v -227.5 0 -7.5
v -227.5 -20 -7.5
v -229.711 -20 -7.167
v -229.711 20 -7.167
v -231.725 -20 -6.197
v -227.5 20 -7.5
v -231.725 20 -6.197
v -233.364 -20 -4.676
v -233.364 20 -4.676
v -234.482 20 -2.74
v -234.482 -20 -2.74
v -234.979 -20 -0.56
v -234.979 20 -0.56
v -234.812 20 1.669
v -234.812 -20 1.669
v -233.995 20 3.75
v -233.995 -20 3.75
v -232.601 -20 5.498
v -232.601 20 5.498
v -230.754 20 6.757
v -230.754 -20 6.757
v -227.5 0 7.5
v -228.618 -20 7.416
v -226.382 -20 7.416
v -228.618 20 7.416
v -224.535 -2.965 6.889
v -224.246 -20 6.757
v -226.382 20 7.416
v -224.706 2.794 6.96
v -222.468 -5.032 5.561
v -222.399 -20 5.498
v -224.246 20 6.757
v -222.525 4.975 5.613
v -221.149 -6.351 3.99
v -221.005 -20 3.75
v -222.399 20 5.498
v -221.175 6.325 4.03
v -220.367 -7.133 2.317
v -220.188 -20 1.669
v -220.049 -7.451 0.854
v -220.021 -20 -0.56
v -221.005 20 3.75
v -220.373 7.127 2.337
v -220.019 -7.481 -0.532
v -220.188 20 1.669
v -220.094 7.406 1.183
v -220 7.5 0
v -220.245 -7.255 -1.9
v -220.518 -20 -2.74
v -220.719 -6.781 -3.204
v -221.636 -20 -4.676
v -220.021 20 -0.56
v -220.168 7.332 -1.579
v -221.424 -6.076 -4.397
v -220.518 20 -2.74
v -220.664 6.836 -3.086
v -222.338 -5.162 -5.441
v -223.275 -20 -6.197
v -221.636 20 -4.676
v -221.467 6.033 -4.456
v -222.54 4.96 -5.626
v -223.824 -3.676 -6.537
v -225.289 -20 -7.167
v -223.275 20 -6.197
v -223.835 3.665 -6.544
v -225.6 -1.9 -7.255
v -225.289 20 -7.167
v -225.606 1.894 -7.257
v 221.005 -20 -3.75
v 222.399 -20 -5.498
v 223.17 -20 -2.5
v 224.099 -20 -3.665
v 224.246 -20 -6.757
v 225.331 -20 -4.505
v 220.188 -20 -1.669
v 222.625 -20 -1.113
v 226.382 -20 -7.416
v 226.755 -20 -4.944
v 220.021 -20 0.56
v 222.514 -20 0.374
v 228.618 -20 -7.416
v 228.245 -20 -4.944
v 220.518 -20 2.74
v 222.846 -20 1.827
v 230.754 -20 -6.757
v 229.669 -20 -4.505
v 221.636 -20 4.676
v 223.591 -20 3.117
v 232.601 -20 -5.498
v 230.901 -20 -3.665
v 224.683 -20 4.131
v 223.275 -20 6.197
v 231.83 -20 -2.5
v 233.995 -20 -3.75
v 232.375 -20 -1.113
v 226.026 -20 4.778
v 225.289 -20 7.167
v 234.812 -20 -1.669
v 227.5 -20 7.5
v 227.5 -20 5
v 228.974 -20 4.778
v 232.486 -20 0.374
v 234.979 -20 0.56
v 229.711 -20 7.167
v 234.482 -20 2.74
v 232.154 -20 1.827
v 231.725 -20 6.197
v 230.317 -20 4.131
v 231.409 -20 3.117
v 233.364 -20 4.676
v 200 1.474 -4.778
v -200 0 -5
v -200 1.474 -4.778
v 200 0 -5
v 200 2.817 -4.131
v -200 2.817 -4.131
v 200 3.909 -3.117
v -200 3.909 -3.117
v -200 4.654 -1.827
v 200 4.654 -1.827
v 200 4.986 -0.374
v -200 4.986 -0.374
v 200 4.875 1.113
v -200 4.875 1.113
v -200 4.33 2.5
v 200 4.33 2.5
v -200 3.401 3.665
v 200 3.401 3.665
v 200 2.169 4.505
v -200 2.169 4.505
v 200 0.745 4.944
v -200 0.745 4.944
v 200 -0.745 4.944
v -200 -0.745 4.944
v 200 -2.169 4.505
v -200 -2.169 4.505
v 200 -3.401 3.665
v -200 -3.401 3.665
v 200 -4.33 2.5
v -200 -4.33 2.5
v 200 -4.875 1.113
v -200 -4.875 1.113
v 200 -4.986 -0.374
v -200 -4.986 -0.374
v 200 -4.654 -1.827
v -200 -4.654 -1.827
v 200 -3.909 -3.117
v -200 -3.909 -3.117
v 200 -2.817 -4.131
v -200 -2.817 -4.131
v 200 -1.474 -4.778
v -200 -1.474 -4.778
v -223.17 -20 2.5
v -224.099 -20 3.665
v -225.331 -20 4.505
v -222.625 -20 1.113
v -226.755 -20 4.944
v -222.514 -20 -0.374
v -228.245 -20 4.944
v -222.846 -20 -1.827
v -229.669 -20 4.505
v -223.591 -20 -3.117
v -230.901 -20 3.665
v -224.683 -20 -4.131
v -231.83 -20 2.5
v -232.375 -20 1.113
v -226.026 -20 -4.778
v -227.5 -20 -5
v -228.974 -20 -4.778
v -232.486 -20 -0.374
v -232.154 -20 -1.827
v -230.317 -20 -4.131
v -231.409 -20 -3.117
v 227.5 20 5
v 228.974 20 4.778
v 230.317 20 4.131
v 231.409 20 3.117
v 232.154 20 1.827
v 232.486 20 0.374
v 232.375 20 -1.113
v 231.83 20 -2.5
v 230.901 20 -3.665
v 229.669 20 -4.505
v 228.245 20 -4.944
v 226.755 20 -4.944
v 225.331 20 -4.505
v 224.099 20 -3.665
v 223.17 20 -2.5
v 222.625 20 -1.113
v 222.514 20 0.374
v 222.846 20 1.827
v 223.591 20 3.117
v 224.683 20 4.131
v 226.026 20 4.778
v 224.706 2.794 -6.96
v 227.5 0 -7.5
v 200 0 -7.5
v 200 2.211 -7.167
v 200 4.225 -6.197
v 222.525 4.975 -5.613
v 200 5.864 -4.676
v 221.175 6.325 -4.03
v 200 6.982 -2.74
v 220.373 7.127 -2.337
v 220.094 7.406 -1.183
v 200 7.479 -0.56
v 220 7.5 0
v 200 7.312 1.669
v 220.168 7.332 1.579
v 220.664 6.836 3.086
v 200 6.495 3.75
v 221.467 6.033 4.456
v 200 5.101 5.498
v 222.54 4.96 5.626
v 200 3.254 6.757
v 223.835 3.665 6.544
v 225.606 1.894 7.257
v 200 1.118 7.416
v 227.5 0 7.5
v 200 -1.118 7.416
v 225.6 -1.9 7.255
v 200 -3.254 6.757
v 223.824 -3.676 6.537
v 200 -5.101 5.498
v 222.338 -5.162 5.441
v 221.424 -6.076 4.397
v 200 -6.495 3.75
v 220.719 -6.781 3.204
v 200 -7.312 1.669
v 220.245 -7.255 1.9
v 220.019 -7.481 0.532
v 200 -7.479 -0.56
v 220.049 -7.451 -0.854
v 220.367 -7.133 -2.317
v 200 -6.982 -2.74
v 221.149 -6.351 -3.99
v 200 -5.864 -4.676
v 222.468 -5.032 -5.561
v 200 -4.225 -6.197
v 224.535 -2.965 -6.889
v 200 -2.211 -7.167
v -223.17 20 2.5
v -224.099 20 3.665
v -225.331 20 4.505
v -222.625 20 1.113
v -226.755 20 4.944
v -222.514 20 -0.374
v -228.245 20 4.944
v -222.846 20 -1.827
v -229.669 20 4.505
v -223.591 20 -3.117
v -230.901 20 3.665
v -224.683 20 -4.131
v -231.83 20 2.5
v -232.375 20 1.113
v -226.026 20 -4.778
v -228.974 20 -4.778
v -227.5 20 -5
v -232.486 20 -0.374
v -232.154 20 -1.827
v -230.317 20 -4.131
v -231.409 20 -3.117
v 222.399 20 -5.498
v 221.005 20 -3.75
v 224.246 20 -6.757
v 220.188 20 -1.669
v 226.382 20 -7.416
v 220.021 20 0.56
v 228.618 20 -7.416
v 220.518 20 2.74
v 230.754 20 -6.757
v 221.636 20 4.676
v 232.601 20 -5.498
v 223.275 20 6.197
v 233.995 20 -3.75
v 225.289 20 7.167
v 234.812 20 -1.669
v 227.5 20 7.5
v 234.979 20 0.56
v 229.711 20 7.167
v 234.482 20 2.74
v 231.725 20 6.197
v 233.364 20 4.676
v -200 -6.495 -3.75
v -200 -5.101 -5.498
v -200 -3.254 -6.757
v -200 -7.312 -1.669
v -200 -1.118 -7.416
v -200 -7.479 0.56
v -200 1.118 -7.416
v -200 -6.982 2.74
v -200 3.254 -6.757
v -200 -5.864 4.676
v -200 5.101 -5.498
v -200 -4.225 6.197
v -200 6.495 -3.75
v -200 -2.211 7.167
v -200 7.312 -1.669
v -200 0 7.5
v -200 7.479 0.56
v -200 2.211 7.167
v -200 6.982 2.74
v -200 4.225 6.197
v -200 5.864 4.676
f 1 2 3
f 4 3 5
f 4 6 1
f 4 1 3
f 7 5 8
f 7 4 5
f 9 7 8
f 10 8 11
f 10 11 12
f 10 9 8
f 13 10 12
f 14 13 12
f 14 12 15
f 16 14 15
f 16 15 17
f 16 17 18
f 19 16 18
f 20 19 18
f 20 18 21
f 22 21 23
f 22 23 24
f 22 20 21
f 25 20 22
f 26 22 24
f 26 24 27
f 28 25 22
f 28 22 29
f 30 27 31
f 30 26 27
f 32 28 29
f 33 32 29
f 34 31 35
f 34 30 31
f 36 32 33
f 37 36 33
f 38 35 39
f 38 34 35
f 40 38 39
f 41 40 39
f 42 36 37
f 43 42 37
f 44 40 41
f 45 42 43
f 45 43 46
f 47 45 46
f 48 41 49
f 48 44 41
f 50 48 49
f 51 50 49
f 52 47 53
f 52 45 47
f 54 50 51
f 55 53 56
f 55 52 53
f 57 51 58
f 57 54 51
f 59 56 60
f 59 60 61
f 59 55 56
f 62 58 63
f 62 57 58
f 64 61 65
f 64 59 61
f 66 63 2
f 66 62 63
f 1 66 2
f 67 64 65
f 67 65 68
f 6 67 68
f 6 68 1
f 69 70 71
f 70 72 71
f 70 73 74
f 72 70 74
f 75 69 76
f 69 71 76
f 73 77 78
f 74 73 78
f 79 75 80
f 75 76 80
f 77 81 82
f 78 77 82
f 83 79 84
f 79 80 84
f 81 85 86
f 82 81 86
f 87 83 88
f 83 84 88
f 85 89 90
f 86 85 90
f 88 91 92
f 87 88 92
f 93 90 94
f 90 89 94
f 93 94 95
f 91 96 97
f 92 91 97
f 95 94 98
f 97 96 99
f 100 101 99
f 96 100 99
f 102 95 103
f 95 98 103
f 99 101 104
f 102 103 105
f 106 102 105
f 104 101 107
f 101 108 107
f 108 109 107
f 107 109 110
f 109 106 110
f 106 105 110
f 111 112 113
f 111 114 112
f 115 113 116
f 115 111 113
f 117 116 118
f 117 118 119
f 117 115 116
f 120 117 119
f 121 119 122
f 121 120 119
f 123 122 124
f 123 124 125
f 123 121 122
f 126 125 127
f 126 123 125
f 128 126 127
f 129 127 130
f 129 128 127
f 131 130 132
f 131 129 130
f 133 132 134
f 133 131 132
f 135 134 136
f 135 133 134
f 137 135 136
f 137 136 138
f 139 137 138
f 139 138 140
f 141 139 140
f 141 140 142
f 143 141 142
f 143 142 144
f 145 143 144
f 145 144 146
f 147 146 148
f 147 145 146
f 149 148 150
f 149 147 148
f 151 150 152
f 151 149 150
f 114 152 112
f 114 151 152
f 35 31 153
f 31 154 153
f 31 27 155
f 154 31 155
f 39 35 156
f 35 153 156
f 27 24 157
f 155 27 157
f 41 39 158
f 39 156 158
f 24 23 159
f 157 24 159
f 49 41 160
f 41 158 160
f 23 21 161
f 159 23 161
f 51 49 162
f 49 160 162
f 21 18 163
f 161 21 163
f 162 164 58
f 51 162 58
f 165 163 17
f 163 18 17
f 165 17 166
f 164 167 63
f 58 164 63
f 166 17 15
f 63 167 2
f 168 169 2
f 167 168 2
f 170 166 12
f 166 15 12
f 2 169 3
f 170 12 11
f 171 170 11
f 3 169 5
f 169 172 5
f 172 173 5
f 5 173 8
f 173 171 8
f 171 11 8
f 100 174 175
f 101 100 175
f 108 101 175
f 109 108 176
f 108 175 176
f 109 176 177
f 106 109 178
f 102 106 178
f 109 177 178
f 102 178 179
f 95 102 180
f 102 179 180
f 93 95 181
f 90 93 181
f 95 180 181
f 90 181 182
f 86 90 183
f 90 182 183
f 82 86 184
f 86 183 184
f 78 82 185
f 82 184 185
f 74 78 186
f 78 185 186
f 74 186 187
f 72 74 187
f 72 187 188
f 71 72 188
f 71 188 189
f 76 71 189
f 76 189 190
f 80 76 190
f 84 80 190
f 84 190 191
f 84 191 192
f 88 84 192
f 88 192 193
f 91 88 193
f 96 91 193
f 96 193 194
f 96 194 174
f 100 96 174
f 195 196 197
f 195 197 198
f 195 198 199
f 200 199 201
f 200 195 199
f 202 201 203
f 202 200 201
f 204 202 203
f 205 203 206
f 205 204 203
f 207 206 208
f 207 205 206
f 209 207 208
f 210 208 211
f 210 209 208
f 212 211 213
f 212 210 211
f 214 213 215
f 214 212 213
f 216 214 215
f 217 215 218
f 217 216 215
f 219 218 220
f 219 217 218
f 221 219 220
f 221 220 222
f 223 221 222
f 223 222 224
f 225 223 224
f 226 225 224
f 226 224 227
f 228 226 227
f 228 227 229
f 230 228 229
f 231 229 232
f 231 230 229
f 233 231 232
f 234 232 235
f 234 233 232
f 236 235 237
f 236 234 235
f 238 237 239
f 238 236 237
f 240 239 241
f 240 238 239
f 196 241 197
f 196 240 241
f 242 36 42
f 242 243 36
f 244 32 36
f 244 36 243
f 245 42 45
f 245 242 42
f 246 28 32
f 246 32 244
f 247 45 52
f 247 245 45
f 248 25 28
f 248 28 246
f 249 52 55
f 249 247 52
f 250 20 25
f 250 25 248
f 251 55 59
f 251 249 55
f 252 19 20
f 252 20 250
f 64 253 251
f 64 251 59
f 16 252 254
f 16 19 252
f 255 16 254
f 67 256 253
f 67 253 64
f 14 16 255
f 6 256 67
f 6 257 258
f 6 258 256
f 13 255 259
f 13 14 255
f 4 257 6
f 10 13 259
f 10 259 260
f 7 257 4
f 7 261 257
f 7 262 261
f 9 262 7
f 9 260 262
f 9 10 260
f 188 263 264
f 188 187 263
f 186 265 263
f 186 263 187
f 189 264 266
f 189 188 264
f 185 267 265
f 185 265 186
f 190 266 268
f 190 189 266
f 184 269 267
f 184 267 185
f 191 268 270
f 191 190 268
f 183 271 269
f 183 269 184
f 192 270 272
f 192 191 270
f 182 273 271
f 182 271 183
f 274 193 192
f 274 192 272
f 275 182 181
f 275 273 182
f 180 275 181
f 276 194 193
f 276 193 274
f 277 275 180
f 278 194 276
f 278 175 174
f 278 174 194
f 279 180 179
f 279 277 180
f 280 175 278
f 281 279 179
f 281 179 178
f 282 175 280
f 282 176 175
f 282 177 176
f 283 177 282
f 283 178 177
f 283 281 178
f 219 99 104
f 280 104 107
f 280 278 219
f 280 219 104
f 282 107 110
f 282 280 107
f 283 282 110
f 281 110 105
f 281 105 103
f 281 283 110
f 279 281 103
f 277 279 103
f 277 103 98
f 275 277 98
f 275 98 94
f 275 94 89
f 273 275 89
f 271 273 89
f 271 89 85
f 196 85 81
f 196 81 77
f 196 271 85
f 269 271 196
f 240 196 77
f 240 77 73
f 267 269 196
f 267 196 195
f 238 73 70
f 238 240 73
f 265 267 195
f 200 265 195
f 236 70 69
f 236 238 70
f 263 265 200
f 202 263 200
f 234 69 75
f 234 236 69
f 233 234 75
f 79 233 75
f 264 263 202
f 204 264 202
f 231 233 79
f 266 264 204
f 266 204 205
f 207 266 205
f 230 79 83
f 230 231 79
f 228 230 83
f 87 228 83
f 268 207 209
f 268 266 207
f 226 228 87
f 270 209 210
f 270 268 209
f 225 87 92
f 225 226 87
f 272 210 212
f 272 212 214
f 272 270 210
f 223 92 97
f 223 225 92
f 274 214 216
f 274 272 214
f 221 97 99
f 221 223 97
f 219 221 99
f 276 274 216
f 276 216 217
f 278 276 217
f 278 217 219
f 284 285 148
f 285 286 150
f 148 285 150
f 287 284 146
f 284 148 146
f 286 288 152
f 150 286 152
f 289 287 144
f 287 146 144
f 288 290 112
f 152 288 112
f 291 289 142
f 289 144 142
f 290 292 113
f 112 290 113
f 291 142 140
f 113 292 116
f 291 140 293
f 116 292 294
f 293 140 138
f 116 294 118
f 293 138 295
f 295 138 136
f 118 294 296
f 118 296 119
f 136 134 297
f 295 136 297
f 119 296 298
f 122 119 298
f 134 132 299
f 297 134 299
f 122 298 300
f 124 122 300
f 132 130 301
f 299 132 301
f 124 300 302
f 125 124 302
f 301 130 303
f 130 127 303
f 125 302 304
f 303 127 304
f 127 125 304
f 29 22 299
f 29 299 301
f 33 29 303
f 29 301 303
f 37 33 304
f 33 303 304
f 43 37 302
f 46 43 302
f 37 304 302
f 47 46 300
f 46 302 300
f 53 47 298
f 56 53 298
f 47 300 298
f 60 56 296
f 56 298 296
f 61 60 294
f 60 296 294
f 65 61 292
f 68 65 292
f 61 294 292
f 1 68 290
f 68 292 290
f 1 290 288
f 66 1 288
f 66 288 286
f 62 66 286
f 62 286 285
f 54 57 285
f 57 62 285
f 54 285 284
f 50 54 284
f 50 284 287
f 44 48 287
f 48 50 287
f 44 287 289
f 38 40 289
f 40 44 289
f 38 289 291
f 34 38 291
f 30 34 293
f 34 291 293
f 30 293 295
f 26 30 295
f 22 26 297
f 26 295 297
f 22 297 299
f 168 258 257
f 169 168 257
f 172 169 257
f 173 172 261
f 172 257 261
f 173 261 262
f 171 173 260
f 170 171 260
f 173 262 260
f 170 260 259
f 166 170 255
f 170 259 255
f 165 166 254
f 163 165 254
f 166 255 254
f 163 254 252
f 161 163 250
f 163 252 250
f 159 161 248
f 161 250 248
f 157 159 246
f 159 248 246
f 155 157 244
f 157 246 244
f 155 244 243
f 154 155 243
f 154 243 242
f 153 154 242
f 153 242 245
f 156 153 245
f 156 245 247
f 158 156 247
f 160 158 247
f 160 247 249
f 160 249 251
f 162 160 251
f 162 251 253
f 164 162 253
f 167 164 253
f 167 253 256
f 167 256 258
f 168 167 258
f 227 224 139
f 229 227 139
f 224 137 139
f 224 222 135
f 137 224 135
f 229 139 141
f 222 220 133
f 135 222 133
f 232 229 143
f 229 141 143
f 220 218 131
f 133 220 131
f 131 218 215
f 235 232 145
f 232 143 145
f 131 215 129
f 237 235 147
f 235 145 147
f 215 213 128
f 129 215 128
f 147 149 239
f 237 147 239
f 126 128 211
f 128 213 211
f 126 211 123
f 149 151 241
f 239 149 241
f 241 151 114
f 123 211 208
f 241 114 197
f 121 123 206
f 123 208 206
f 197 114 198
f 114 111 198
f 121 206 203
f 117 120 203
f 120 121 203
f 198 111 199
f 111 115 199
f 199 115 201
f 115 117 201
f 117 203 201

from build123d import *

# Parameters (mm, degrees)
SKETCH1_R             = 5
BOSS_EXTRUDE1_DEPTH   = 200
SKETCH2_R             = 7.5
BOSS_EXTRUDE2_DEPTH   = 20
BOSS_EXTRUDE2_2_DEPTH = 20
SKETCH3_R             = 7.5
BOSS_EXTRUDE3_DEPTH   = 27.5
BOSS_EXTRUDE4_START   = 27.5
SKETCH4_R             = 7.5
BOSS_EXTRUDE4_DEPTH   = 27.5
SKETCH5_R             = 5
CUT_EXTRUDE1_DEPTH    = 239.497903555


with BuildPart() as part:
    # Sketch1 → Boss-Extrude1 (new, symmetric)
    with BuildSketch(Plane(origin=(0, 0, 0), x_dir=(0, 0, -1), z_dir=(1, 0, 0))):
        Circle(SKETCH1_R)
    extrude(amount=BOSS_EXTRUDE1_DEPTH, both=True)



with BuildPart() as body_2:
    # Sketch2 → Boss-Extrude2 (new, symmetric)
    with BuildSketch(Plane(origin=(0, 0, 0), x_dir=(1, 0, 0), z_dir=(0, 1, 0))):
        with Locations(Location((227.5, 0, 0), (0, 0, 270))):
            Circle(SKETCH2_R)
    extrude(amount=BOSS_EXTRUDE2_DEPTH, both=True)


with BuildPart() as body_3:
    # Sketch2 → Boss-Extrude2 2 (new, symmetric)
    with BuildSketch(Plane(origin=(0, 0, 0), x_dir=(1, 0, 0), z_dir=(0, 1, 0))):
        with Locations(Location((-227.5, 0, 0), (0, 0, 90))):
            Circle(SKETCH2_R)
    extrude(amount=BOSS_EXTRUDE2_2_DEPTH, both=True)


with BuildPart() as part_1:
    add(part.part)

    add(body_3.part)  # Boss-Extrude3 merges body 3
    # Sketch3 → Boss-Extrude3 (add)
    with BuildSketch(Plane.ZY.offset(200)):
        Circle(SKETCH3_R)
    extrude(amount=BOSS_EXTRUDE3_DEPTH)


    add(body_2.part)  # Boss-Extrude4 merges body 2
    # Sketch4 → Boss-Extrude4 (add)
    with BuildSketch(Plane(origin=(200, 0, 0), x_dir=(0, 0, -1), z_dir=(1, 0, 0)).offset(BOSS_EXTRUDE4_START)):
        Circle(SKETCH4_R)
    extrude(amount=-BOSS_EXTRUDE4_DEPTH)

    # Sketch5 → Cut-Extrude1 (cut, through all)
    with BuildSketch(Plane(origin=(0, 20, 0), x_dir=(1, 0, 0), z_dir=(0, 1, 0))):
        with Locations(Location((227.5, 0, 0), (0, 0, 270))):
            Circle(SKETCH5_R)
        with Locations(Location((-227.5, 0, 0), (0, 0, 90))):
            Circle(SKETCH5_R)
    extrude(amount=-CUT_EXTRUDE1_DEPTH, mode=Mode.SUBTRACT)


solid = part_1.part
